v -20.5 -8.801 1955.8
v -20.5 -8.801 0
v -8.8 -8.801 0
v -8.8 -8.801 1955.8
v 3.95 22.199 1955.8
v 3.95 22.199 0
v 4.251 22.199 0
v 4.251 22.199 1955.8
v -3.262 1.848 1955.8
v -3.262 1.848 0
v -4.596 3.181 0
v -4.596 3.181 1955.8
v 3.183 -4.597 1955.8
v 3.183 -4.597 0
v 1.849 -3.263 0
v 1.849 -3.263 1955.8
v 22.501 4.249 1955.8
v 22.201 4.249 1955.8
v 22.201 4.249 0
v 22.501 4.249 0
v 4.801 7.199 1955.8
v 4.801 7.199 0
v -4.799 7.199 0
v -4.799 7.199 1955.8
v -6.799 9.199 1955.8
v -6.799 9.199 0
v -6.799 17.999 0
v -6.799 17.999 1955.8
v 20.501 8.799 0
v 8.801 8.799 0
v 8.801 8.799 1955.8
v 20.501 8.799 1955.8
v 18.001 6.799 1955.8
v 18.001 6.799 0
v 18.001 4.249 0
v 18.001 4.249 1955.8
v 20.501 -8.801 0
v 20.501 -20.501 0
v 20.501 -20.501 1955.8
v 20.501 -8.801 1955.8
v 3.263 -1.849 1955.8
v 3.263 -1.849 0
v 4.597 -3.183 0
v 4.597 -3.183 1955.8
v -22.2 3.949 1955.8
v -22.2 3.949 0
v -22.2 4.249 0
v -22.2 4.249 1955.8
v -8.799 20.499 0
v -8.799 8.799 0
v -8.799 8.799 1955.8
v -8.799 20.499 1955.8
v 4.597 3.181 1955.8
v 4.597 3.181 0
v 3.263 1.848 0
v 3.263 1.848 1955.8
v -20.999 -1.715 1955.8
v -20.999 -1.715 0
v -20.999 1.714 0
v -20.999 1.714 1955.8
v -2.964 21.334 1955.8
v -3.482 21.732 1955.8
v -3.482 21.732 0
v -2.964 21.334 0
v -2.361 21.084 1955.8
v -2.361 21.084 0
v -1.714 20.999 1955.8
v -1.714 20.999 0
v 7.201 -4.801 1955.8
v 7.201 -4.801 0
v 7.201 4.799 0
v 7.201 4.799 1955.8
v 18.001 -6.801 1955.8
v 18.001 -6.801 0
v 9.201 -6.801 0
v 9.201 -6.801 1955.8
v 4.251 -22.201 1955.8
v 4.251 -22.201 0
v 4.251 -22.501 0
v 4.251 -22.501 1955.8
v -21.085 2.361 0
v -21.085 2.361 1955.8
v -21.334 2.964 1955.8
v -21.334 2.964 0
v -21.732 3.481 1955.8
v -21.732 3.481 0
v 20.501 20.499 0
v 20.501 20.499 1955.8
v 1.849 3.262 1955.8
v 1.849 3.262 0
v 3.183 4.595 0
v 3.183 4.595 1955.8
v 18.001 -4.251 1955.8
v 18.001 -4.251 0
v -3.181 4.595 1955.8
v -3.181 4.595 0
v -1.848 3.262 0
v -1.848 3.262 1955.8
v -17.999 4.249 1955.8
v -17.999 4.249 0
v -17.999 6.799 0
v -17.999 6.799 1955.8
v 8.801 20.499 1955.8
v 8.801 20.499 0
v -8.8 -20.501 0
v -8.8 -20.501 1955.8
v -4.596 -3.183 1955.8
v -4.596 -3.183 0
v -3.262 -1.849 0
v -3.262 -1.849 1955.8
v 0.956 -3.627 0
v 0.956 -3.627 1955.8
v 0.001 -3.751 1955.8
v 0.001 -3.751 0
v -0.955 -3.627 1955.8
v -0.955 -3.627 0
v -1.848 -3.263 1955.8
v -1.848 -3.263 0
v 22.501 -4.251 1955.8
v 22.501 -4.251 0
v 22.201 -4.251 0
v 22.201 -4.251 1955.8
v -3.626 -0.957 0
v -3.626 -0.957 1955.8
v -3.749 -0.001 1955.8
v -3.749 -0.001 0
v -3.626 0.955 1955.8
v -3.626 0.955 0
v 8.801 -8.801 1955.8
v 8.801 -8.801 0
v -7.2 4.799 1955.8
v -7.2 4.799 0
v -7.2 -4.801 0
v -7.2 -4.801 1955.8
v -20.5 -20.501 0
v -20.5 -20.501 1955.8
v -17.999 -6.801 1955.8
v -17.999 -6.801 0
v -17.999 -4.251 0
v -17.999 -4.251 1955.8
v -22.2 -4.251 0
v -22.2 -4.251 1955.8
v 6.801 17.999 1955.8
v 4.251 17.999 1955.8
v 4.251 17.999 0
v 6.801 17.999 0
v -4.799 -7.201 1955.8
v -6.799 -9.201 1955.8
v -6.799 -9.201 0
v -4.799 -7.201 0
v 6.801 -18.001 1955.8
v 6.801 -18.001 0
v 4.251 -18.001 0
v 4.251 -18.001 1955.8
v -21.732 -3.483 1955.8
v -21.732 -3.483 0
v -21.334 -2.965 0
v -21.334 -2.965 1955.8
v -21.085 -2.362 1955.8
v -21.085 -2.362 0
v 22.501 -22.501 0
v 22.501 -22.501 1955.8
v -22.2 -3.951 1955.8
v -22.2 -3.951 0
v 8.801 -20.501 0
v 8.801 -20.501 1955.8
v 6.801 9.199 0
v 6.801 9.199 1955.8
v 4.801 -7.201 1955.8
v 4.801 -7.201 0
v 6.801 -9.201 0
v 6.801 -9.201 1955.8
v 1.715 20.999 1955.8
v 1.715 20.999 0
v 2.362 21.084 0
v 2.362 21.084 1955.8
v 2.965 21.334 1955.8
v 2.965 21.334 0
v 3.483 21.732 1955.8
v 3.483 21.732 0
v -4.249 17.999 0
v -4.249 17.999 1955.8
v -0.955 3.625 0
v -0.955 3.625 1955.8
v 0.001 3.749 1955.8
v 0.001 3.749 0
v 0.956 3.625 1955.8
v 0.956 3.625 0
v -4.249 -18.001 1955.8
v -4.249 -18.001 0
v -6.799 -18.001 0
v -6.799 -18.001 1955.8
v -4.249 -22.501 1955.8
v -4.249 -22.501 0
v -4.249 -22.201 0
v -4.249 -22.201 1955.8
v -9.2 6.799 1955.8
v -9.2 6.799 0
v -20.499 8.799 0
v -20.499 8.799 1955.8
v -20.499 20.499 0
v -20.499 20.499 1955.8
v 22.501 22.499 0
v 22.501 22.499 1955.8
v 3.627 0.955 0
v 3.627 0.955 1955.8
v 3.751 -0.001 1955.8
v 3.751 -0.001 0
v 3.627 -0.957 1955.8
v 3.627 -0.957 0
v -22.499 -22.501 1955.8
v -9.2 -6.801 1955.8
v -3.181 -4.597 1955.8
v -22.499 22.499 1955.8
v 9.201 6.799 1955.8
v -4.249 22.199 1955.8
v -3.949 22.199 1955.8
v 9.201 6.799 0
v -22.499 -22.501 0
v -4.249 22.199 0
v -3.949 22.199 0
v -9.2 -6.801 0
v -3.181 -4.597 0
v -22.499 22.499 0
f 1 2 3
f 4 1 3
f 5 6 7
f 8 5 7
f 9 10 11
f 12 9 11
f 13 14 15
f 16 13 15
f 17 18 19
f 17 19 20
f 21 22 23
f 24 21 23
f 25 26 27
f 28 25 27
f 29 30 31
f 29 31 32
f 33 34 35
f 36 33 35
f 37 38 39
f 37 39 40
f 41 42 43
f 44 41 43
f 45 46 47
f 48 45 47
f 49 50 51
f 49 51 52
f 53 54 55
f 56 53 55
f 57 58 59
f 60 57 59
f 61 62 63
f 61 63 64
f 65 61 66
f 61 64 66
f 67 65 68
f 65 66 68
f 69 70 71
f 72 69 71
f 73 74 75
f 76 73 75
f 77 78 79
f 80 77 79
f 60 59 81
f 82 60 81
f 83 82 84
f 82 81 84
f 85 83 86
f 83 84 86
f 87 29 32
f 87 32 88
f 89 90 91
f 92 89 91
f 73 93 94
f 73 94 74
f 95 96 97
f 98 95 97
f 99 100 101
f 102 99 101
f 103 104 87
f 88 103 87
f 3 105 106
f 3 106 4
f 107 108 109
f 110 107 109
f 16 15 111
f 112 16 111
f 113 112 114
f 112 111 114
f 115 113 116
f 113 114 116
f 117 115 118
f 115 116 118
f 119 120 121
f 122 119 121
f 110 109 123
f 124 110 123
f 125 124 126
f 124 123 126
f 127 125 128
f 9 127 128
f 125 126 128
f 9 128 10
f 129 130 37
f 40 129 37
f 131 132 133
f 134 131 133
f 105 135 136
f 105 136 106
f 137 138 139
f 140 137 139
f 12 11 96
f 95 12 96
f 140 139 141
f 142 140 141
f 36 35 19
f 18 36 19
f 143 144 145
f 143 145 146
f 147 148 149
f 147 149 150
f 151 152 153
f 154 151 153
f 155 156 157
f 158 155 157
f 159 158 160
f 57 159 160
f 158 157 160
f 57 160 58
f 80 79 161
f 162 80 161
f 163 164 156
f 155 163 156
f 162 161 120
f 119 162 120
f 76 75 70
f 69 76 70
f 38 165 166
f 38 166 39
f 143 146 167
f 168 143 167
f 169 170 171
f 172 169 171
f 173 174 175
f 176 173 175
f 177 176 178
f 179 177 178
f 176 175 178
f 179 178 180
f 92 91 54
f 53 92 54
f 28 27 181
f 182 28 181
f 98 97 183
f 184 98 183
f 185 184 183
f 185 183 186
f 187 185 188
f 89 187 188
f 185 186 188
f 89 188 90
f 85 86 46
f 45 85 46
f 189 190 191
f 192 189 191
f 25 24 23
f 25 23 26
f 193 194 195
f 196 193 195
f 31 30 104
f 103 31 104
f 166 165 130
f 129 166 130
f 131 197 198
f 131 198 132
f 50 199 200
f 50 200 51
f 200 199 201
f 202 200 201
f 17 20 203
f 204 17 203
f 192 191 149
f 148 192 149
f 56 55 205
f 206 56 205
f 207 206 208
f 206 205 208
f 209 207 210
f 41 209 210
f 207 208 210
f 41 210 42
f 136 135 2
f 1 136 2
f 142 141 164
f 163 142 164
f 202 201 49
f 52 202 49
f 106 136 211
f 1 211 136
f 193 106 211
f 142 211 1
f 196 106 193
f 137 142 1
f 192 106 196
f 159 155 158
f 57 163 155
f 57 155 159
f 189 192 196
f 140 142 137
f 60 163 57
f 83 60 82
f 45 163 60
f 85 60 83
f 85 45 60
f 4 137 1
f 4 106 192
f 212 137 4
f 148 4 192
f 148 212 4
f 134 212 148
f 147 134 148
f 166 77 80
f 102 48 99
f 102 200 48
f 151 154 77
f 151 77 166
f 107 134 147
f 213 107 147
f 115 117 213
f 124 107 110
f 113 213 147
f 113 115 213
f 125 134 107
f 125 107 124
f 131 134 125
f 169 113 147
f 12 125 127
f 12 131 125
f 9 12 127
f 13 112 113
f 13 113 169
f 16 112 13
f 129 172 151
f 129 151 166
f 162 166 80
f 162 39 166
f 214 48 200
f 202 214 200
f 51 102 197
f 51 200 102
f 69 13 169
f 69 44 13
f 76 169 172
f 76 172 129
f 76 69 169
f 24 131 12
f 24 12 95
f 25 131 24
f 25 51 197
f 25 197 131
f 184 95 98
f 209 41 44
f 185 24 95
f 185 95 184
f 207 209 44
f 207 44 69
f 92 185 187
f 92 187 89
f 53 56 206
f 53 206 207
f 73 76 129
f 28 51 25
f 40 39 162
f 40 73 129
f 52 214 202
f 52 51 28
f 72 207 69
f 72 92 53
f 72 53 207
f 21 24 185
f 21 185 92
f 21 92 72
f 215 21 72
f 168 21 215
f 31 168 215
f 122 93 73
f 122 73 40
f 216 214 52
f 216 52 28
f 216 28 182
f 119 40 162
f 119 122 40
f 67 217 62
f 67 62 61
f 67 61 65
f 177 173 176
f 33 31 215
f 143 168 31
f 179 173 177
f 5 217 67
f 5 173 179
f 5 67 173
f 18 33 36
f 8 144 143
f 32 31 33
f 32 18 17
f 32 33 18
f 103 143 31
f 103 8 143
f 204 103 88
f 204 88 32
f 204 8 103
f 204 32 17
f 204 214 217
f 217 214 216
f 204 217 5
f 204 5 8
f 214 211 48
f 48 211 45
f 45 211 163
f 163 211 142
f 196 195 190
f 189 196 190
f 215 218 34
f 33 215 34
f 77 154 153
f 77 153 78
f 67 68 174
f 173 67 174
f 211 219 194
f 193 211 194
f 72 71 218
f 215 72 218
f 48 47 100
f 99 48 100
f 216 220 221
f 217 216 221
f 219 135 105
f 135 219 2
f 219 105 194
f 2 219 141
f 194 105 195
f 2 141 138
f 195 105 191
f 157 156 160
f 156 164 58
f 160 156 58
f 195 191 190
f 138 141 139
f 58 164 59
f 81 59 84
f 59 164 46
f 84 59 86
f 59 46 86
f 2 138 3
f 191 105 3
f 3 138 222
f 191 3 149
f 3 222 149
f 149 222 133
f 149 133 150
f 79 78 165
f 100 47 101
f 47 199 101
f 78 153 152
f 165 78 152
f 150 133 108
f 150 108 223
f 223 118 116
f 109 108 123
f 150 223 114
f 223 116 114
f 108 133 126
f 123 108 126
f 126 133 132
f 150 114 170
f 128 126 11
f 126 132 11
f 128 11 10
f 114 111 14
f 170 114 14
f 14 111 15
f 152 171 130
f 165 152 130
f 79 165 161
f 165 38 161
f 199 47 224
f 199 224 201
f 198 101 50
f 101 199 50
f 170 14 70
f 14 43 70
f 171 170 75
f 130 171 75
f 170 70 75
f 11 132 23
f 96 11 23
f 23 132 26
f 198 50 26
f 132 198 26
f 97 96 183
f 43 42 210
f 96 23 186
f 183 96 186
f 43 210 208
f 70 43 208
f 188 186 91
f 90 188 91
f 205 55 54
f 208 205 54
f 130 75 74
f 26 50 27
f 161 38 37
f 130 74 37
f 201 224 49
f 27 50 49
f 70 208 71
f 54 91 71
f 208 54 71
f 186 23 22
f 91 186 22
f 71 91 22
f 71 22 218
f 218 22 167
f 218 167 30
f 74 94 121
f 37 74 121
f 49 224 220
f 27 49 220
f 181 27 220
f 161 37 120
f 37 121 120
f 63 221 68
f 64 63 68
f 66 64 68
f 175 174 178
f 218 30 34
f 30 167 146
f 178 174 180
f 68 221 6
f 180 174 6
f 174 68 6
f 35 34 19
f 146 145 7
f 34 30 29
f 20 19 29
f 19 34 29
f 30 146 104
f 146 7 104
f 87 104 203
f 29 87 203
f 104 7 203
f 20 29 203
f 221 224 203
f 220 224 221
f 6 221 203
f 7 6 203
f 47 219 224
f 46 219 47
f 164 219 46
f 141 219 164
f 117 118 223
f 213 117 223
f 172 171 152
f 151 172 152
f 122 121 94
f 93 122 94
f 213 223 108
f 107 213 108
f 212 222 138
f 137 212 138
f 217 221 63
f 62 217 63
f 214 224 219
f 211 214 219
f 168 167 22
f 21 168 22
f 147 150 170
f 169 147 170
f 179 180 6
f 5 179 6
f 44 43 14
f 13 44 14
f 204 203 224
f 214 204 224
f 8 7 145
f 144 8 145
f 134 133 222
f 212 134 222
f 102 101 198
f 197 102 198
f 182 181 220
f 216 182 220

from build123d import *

# Parameters (mm, degrees)
SKETCH1_W           = 11.699975178
SKETCH1_H           = 11.699996949
SKETCH1_W_2         = 11.699990436
SKETCH1_H_2         = 11.699981689
SKETCH1_W_3         = 11.699990437
SKETCH1_H_3         = 11.699975177
SKETCH1_W_4         = 11.699981689
SKETCH1_H_4         = 11.699990436
BOSS_EXTRUDE1_DEPTH = 1955.8


with BuildPart() as part:
    # Sketch1 → Boss-Extrude1 (new body)
    with BuildSketch(Plane.XY):
        Polygon((22.500515052, 22.499297556), (-22.499484399, 22.499298105), (-22.499484948, -22.500701346), (-4.249491942, -22.500701568), (-4.249491942, -22.200733242), (-4.24949208, -18.000719999), (-6.799479919, -18.000719999), (-6.799480207, -9.200732353), (-4.799480391, -7.200732362), (4.800525817, -7.200732047), (6.8005258, -9.200731855), (6.800526088, -18.000720263), (4.250507877, -18.000720263), (4.250508015, -22.200733153), (4.250508015, -22.500701672), (22.500514502, -22.500701895), (22.500514725, -4.250714302), (22.200520351, -4.250714302), (18.000507108, -4.25071444), (18.000507108, -6.800702279), (9.200519462, -6.800702567), (7.200519471, -4.800702751), (7.200519156, 4.799303458), (9.200518964, 6.79930344), (18.000507424, 6.799303729), (18.000507424, 4.249285514), (22.200520261, 4.249285652), (22.500514829, 4.249285652), align=None)
        with BuildLine():
            Line((-4.249491247, 17.999291576), (-4.249490956, 22.199304807))
            Line((-4.249490956, 22.199304807), (-3.949472548, 22.199304807))
            Line((-3.949472548, 22.199304807), (-3.481695222, 21.73152644))
            ThreePointArc((-3.481695222, 21.73152644), (-2.670636178, 21.189593132), (-1.713926324, 20.999291428))
            Line((-1.713926324, 20.999291428), (1.714975167, 20.999291428))
            ThreePointArc((1.714975167, 20.999291428), (2.671722509, 21.189608628), (3.482801459, 21.731583767))
            Line((3.482801459, 21.731583767), (3.950490798, 22.199304487))
            Line((3.950490798, 22.199304487), (4.250509108, 22.199304487))
            Line((4.250509108, 22.199304487), (4.250508817, 17.999291575))
            Line((4.250508817, 17.999291575), (6.800527063, 17.999291575))
            Line((6.800527063, 17.999291575), (6.800526453, 9.199302988))
            Line((6.800526453, 9.199302988), (4.800526064, 7.199302969))
            Line((4.800526064, 7.199302969), (-4.799479817, 7.199303635))
            Line((-4.799479817, 7.199303635), (-6.799479854, 9.199304042))
            Line((-6.799479854, 9.199304042), (-6.799479244, 17.999291576))
            Line((-6.799479244, 17.999291576), (-4.249491247, 17.999291576))
        make_face(mode=Mode.SUBTRACT)
        with BuildLine():
            Line((-22.199510888, 4.249285566), (-17.999497356, 4.249285704))
            Line((-17.999497356, 4.249285704), (-17.999497356, 6.79927354))
            Line((-17.999497356, 6.79927354), (-9.199509947, 6.799273828))
            Line((-9.199509947, 6.799273828), (-7.199509956, 4.799274012))
            Line((-7.199509956, 4.799274012), (-7.199509641, -4.800732197))
            Line((-7.199509641, -4.800732197), (-9.199509449, -6.800732179))
            Line((-9.199509449, -6.800732179), (-17.99949762, -6.800732468))
            Line((-17.99949762, -6.800732468), (-17.99949762, -4.250714253))
            Line((-17.99949762, -4.250714253), (-22.199510799, -4.250714391))
            Line((-22.199510799, -4.250714391), (-22.199510799, -3.950696126))
            Line((-22.199510799, -3.950696126), (-21.731790056, -3.48300681))
            ThreePointArc((-21.731790056, -3.48300681), (-21.189814855, -2.671927844), (-20.999497617, -1.71518046))
            Line((-20.999497617, -1.71518046), (-20.999497617, 1.713721031))
            ThreePointArc((-20.999497617, 1.713721031), (-21.189799286, 2.670430863), (-21.731732544, 3.481489907))
            Line((-21.731732544, 3.481489907), (-22.199510888, 3.949267256))
            Line((-22.199510888, 3.949267256), (-22.199510888, 4.249285566))
        make_face(mode=Mode.SUBTRACT)
        with Locations((-14.649542346, -14.650709384)):
            Rectangle(SKETCH1_W, SKETCH1_H, mode=Mode.SUBTRACT)
        with Locations((14.65050626, -14.650767962)):
            Rectangle(SKETCH1_W_2, SKETCH1_H_2, mode=Mode.SUBTRACT)
        with BuildLine():
            Line((-3.181457266, -4.596908447), (-4.595670829, -3.182694885))
            Line((-4.595670829, -3.182694885), (-3.26221457, -1.849238626))
            ThreePointArc((-3.26221457, -1.849238626), (-3.749476751, -0.00071437), (-3.26221457, 1.847809887))
            Line((-3.26221457, 1.847809887), (-4.595670829, 3.181266146))
            Line((-4.595670829, 3.181266146), (-3.181457266, 4.595479708))
            Line((-3.181457266, 4.595479708), (-1.848001007, 3.262023449))
            ThreePointArc((-1.848001007, 3.262023449), (0.000523249, 3.74928563), (1.849047505, 3.262023449))
            Line((1.849047505, 3.262023449), (3.182503764, 4.595479708))
            Line((3.182503764, 4.595479708), (4.596717327, 3.181266146))
            Line((4.596717327, 3.181266146), (3.263261068, 1.847809887))
            ThreePointArc((3.263261068, 1.847809887), (3.750523249, -0.00071437), (3.263261068, -1.849238626))
            Line((3.263261068, -1.849238626), (4.596717327, -3.182694885))
            Line((4.596717327, -3.182694885), (3.182503764, -4.596908447))
            Line((3.182503764, -4.596908447), (1.849047505, -3.263452188))
            ThreePointArc((1.849047505, -3.263452188), (0.000523249, -3.75071437), (-1.848001007, -3.263452188))
            Line((-1.848001007, -3.263452188), (-3.181457266, -4.596908447))
        make_face(mode=Mode.SUBTRACT)
        with Locations((-14.64949028, 14.649335967)):
            Rectangle(SKETCH1_W_3, SKETCH1_H_3, mode=Mode.SUBTRACT)
        with Locations((14.650561583, 14.6492839)):
            Rectangle(SKETCH1_W_4, SKETCH1_H_4, mode=Mode.SUBTRACT)
    extrude(amount=BOSS_EXTRUDE1_DEPTH)


solid = part.part
